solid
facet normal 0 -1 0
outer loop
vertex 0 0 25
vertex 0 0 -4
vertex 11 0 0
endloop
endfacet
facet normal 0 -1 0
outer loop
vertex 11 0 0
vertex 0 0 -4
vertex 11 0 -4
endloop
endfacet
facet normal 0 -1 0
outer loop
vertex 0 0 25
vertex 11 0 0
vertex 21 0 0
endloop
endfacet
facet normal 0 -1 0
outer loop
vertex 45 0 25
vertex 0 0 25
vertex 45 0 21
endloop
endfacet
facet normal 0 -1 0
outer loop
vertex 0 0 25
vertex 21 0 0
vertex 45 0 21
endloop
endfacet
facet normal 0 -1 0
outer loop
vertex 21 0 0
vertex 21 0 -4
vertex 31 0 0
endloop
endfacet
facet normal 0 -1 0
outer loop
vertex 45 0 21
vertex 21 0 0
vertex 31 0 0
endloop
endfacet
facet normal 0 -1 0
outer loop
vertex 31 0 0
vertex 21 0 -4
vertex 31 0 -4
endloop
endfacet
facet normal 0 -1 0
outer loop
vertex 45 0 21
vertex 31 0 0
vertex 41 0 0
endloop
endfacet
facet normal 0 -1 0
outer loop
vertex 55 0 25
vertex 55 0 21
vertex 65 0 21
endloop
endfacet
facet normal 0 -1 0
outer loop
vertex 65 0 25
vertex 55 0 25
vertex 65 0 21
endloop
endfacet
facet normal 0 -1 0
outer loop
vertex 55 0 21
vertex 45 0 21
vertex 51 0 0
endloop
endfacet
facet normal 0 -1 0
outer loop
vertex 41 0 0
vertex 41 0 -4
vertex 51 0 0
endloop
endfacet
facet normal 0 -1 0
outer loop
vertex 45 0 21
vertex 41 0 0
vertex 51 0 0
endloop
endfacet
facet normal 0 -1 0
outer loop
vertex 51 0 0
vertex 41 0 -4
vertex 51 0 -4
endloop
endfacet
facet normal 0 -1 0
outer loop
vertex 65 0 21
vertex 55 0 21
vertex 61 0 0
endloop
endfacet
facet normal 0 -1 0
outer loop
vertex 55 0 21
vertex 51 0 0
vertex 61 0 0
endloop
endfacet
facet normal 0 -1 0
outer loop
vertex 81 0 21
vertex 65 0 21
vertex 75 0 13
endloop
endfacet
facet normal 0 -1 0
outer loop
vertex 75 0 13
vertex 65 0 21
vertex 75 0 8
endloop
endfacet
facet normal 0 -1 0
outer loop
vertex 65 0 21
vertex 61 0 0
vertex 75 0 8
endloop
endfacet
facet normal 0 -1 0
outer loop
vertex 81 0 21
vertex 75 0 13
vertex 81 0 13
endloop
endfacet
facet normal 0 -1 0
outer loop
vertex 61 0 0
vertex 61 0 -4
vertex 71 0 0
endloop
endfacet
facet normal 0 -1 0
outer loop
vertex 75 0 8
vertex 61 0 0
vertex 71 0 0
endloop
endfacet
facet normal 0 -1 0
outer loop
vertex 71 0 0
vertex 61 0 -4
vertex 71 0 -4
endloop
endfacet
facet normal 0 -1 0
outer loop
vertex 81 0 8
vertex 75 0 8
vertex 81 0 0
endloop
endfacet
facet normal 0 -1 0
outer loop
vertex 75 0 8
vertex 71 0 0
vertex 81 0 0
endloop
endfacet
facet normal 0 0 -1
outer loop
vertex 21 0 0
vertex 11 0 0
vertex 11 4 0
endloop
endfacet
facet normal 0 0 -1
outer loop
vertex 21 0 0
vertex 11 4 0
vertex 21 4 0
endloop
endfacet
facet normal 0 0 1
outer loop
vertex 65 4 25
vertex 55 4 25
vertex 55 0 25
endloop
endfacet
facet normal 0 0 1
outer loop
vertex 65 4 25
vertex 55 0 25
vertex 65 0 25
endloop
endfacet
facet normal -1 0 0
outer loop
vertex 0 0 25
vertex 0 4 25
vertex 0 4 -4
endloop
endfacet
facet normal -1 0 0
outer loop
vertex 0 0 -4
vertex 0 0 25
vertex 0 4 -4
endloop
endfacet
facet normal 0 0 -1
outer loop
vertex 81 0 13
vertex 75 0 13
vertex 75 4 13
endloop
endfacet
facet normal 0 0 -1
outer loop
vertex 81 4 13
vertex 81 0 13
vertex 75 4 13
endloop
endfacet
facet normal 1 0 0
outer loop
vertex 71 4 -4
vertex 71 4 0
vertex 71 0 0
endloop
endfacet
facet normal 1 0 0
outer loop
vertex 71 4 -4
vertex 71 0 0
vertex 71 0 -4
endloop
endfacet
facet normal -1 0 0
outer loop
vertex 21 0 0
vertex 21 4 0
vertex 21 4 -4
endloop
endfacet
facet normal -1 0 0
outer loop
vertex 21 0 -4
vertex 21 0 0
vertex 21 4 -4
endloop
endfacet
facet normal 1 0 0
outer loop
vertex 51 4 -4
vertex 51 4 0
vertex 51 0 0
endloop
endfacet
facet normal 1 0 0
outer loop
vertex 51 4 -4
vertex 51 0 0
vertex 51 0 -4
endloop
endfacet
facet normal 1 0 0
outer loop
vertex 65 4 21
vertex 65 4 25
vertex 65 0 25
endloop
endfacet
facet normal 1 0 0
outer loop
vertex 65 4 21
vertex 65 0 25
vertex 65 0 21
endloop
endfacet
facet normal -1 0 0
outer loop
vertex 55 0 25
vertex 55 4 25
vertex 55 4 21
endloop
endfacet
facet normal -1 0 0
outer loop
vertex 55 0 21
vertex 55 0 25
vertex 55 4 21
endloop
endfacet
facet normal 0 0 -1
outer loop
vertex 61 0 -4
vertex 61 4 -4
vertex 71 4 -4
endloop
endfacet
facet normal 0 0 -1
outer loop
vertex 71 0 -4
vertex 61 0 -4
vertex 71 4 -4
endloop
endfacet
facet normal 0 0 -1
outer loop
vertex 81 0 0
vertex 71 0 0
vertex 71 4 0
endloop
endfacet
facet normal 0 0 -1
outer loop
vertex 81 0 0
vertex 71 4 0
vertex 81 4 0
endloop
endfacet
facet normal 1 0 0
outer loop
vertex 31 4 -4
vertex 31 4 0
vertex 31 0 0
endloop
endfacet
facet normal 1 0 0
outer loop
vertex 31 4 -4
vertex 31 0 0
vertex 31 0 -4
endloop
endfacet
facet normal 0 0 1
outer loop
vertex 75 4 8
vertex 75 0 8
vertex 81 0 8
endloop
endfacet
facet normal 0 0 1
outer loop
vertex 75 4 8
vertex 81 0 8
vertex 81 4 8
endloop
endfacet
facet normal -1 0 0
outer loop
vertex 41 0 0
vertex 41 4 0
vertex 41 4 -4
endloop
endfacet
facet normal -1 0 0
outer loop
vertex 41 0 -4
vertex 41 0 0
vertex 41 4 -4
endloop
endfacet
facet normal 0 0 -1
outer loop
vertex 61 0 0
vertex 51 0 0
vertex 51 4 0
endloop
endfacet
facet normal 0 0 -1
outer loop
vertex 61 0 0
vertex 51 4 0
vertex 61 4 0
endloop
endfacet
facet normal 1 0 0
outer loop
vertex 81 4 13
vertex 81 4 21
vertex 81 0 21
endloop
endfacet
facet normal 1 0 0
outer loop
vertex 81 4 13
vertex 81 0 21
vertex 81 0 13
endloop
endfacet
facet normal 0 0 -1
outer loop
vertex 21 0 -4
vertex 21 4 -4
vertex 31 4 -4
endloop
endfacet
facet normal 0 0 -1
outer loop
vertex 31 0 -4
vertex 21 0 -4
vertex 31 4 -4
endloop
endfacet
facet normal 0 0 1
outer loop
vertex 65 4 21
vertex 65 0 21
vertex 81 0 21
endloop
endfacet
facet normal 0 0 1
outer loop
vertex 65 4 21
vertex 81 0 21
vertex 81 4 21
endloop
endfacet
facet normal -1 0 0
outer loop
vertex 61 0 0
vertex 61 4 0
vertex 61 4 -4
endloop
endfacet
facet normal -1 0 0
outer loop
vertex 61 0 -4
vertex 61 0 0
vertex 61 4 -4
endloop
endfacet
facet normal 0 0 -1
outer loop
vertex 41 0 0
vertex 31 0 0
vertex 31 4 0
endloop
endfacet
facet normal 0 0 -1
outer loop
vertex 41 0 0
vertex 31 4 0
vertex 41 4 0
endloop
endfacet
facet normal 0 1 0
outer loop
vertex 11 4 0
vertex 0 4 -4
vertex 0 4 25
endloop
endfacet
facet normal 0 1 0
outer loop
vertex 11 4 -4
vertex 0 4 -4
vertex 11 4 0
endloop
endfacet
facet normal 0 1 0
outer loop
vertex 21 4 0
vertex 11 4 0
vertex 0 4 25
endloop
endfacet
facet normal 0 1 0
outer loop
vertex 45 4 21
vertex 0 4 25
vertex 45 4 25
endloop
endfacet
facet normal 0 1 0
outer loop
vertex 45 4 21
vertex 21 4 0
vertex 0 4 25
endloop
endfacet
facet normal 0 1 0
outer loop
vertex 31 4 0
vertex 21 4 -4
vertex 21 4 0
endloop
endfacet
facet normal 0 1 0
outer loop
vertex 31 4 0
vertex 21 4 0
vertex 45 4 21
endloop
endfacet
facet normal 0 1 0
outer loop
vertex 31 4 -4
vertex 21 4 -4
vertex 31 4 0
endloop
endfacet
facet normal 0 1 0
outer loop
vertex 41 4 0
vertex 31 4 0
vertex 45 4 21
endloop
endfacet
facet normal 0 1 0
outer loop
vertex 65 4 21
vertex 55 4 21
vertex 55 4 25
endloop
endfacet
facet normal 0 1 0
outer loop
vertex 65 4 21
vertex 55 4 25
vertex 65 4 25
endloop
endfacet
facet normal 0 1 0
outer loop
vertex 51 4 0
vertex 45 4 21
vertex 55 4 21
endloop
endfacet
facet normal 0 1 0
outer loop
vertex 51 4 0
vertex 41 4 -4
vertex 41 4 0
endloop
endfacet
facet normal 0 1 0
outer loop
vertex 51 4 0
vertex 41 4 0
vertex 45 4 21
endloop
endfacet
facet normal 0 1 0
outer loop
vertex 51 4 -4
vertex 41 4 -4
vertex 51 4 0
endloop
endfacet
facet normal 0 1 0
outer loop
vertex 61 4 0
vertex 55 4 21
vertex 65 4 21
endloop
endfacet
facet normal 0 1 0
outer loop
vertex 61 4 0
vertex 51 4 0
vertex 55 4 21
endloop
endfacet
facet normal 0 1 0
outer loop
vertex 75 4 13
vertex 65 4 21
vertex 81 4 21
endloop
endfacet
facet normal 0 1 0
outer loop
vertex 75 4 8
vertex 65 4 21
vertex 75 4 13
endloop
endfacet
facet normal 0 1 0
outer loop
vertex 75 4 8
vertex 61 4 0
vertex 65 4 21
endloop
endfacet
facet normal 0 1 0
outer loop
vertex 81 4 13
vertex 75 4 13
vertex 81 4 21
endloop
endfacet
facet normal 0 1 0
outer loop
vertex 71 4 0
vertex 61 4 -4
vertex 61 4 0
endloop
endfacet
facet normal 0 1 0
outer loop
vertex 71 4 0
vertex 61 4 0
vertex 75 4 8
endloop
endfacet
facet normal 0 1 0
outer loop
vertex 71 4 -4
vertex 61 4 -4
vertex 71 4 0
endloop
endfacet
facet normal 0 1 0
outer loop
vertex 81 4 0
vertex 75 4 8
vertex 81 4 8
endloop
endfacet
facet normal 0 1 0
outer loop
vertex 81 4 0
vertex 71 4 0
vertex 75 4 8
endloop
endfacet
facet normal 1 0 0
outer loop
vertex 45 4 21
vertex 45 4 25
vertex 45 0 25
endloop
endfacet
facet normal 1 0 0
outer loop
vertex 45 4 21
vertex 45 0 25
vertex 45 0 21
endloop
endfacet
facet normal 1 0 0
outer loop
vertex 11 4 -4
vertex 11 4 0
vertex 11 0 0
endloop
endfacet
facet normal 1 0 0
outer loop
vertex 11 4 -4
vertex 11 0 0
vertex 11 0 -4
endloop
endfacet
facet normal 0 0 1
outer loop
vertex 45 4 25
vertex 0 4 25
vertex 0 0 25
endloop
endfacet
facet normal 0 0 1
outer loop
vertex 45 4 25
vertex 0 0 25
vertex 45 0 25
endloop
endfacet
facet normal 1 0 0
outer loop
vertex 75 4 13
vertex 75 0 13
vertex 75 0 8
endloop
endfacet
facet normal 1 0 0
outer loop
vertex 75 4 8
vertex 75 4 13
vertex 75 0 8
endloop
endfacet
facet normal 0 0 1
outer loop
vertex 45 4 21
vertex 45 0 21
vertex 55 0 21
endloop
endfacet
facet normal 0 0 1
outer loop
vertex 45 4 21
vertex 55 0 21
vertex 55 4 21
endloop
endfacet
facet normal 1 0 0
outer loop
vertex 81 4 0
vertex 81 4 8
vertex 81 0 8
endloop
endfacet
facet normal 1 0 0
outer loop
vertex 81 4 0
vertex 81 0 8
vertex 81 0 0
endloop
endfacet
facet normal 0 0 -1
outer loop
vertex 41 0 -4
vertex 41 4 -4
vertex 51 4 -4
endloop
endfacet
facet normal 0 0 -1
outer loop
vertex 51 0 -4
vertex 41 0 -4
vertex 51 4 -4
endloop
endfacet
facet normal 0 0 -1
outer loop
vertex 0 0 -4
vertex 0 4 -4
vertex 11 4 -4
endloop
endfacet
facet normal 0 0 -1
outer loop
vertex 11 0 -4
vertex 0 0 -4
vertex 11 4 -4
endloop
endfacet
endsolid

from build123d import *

# Parameters (mm, degrees)
SKETCH1_W           = 75
SKETCH1_H           = 21
BOSS_EXTRUDE1_DEPTH = 4
SKETCH2_W           = 8
SKETCH2_H           = 4
BOSS_EXTRUDE2_DEPTH = 6
SKETCH3_W           = 10
SKETCH3_H           = 4
BOSS_EXTRUDE3_DEPTH = 4
LPATTERN1_COUNT     = 4
LPATTERN1_PITCH     = 20
SKETCH4_W           = 1
SKETCH4_H           = 4
BOSS_EXTRUDE4_DEPTH = 4
SKETCH5_W           = 45
SKETCH5_H           = 4
SKETCH5_W_2         = 10
BOSS_EXTRUDE5_DEPTH = 4


with BuildPart() as part:
    # Sketch1 → Boss-Extrude1 (new body)
    with BuildSketch(Plane(origin=(0, 0, 0), x_dir=(1, 0, 0), z_dir=(0, 1, 0))):
        with Locations((37.5, -10.5)):
            Rectangle(SKETCH1_W, SKETCH1_H)
    extrude(amount=BOSS_EXTRUDE1_DEPTH)

    # Sketch2 → Boss-Extrude2 (add)
    with BuildSketch(Plane(origin=(75, 0, 0), x_dir=(0, 0, -1), z_dir=(1, 0, 0))):
        with Locations((-17, 2)):
            Rectangle(SKETCH2_W, SKETCH2_H)
        with Locations((-4, 2)):
            Rectangle(SKETCH2_W, SKETCH2_H)
    extrude(amount=BOSS_EXTRUDE2_DEPTH)

    # Sketch3 → Boss-Extrude3 (add, through all)
    with BuildSketch(Plane(origin=(0, 4, 0), x_dir=(1, 0, 0), z_dir=(0, 1, 0))):
        with Locations((66, 2)):
            Rectangle(SKETCH3_W, SKETCH3_H)
    boss_extrude3 = extrude(amount=-BOSS_EXTRUDE3_DEPTH)

    # LPattern1: Boss-Extrude3 ×4
    with Locations(*[(-i * LPATTERN1_PITCH, 0, 0) for i in range(1, LPATTERN1_COUNT)]):
        add(boss_extrude3)

    # Sketch4 → Boss-Extrude4 (add, through all)
    with BuildSketch(Plane(origin=(0, 4, 0), x_dir=(1, 0, 0), z_dir=(0, 1, 0))):
        with Locations((0.5, 2)):
            Rectangle(SKETCH4_W, SKETCH4_H)
    extrude(amount=-BOSS_EXTRUDE4_DEPTH)

    # Sketch5 → Boss-Extrude5 (add, through all)
    with BuildSketch(Plane(origin=(0, 4, 0), x_dir=(1, 0, 0), z_dir=(0, 1, 0))):
        with Locations((22.5, -23)):
            Rectangle(SKETCH5_W, SKETCH5_H)
        with Locations((60, -23)):
            Rectangle(SKETCH5_W_2, SKETCH5_H)
    extrude(amount=-BOSS_EXTRUDE5_DEPTH)


solid = part.part
